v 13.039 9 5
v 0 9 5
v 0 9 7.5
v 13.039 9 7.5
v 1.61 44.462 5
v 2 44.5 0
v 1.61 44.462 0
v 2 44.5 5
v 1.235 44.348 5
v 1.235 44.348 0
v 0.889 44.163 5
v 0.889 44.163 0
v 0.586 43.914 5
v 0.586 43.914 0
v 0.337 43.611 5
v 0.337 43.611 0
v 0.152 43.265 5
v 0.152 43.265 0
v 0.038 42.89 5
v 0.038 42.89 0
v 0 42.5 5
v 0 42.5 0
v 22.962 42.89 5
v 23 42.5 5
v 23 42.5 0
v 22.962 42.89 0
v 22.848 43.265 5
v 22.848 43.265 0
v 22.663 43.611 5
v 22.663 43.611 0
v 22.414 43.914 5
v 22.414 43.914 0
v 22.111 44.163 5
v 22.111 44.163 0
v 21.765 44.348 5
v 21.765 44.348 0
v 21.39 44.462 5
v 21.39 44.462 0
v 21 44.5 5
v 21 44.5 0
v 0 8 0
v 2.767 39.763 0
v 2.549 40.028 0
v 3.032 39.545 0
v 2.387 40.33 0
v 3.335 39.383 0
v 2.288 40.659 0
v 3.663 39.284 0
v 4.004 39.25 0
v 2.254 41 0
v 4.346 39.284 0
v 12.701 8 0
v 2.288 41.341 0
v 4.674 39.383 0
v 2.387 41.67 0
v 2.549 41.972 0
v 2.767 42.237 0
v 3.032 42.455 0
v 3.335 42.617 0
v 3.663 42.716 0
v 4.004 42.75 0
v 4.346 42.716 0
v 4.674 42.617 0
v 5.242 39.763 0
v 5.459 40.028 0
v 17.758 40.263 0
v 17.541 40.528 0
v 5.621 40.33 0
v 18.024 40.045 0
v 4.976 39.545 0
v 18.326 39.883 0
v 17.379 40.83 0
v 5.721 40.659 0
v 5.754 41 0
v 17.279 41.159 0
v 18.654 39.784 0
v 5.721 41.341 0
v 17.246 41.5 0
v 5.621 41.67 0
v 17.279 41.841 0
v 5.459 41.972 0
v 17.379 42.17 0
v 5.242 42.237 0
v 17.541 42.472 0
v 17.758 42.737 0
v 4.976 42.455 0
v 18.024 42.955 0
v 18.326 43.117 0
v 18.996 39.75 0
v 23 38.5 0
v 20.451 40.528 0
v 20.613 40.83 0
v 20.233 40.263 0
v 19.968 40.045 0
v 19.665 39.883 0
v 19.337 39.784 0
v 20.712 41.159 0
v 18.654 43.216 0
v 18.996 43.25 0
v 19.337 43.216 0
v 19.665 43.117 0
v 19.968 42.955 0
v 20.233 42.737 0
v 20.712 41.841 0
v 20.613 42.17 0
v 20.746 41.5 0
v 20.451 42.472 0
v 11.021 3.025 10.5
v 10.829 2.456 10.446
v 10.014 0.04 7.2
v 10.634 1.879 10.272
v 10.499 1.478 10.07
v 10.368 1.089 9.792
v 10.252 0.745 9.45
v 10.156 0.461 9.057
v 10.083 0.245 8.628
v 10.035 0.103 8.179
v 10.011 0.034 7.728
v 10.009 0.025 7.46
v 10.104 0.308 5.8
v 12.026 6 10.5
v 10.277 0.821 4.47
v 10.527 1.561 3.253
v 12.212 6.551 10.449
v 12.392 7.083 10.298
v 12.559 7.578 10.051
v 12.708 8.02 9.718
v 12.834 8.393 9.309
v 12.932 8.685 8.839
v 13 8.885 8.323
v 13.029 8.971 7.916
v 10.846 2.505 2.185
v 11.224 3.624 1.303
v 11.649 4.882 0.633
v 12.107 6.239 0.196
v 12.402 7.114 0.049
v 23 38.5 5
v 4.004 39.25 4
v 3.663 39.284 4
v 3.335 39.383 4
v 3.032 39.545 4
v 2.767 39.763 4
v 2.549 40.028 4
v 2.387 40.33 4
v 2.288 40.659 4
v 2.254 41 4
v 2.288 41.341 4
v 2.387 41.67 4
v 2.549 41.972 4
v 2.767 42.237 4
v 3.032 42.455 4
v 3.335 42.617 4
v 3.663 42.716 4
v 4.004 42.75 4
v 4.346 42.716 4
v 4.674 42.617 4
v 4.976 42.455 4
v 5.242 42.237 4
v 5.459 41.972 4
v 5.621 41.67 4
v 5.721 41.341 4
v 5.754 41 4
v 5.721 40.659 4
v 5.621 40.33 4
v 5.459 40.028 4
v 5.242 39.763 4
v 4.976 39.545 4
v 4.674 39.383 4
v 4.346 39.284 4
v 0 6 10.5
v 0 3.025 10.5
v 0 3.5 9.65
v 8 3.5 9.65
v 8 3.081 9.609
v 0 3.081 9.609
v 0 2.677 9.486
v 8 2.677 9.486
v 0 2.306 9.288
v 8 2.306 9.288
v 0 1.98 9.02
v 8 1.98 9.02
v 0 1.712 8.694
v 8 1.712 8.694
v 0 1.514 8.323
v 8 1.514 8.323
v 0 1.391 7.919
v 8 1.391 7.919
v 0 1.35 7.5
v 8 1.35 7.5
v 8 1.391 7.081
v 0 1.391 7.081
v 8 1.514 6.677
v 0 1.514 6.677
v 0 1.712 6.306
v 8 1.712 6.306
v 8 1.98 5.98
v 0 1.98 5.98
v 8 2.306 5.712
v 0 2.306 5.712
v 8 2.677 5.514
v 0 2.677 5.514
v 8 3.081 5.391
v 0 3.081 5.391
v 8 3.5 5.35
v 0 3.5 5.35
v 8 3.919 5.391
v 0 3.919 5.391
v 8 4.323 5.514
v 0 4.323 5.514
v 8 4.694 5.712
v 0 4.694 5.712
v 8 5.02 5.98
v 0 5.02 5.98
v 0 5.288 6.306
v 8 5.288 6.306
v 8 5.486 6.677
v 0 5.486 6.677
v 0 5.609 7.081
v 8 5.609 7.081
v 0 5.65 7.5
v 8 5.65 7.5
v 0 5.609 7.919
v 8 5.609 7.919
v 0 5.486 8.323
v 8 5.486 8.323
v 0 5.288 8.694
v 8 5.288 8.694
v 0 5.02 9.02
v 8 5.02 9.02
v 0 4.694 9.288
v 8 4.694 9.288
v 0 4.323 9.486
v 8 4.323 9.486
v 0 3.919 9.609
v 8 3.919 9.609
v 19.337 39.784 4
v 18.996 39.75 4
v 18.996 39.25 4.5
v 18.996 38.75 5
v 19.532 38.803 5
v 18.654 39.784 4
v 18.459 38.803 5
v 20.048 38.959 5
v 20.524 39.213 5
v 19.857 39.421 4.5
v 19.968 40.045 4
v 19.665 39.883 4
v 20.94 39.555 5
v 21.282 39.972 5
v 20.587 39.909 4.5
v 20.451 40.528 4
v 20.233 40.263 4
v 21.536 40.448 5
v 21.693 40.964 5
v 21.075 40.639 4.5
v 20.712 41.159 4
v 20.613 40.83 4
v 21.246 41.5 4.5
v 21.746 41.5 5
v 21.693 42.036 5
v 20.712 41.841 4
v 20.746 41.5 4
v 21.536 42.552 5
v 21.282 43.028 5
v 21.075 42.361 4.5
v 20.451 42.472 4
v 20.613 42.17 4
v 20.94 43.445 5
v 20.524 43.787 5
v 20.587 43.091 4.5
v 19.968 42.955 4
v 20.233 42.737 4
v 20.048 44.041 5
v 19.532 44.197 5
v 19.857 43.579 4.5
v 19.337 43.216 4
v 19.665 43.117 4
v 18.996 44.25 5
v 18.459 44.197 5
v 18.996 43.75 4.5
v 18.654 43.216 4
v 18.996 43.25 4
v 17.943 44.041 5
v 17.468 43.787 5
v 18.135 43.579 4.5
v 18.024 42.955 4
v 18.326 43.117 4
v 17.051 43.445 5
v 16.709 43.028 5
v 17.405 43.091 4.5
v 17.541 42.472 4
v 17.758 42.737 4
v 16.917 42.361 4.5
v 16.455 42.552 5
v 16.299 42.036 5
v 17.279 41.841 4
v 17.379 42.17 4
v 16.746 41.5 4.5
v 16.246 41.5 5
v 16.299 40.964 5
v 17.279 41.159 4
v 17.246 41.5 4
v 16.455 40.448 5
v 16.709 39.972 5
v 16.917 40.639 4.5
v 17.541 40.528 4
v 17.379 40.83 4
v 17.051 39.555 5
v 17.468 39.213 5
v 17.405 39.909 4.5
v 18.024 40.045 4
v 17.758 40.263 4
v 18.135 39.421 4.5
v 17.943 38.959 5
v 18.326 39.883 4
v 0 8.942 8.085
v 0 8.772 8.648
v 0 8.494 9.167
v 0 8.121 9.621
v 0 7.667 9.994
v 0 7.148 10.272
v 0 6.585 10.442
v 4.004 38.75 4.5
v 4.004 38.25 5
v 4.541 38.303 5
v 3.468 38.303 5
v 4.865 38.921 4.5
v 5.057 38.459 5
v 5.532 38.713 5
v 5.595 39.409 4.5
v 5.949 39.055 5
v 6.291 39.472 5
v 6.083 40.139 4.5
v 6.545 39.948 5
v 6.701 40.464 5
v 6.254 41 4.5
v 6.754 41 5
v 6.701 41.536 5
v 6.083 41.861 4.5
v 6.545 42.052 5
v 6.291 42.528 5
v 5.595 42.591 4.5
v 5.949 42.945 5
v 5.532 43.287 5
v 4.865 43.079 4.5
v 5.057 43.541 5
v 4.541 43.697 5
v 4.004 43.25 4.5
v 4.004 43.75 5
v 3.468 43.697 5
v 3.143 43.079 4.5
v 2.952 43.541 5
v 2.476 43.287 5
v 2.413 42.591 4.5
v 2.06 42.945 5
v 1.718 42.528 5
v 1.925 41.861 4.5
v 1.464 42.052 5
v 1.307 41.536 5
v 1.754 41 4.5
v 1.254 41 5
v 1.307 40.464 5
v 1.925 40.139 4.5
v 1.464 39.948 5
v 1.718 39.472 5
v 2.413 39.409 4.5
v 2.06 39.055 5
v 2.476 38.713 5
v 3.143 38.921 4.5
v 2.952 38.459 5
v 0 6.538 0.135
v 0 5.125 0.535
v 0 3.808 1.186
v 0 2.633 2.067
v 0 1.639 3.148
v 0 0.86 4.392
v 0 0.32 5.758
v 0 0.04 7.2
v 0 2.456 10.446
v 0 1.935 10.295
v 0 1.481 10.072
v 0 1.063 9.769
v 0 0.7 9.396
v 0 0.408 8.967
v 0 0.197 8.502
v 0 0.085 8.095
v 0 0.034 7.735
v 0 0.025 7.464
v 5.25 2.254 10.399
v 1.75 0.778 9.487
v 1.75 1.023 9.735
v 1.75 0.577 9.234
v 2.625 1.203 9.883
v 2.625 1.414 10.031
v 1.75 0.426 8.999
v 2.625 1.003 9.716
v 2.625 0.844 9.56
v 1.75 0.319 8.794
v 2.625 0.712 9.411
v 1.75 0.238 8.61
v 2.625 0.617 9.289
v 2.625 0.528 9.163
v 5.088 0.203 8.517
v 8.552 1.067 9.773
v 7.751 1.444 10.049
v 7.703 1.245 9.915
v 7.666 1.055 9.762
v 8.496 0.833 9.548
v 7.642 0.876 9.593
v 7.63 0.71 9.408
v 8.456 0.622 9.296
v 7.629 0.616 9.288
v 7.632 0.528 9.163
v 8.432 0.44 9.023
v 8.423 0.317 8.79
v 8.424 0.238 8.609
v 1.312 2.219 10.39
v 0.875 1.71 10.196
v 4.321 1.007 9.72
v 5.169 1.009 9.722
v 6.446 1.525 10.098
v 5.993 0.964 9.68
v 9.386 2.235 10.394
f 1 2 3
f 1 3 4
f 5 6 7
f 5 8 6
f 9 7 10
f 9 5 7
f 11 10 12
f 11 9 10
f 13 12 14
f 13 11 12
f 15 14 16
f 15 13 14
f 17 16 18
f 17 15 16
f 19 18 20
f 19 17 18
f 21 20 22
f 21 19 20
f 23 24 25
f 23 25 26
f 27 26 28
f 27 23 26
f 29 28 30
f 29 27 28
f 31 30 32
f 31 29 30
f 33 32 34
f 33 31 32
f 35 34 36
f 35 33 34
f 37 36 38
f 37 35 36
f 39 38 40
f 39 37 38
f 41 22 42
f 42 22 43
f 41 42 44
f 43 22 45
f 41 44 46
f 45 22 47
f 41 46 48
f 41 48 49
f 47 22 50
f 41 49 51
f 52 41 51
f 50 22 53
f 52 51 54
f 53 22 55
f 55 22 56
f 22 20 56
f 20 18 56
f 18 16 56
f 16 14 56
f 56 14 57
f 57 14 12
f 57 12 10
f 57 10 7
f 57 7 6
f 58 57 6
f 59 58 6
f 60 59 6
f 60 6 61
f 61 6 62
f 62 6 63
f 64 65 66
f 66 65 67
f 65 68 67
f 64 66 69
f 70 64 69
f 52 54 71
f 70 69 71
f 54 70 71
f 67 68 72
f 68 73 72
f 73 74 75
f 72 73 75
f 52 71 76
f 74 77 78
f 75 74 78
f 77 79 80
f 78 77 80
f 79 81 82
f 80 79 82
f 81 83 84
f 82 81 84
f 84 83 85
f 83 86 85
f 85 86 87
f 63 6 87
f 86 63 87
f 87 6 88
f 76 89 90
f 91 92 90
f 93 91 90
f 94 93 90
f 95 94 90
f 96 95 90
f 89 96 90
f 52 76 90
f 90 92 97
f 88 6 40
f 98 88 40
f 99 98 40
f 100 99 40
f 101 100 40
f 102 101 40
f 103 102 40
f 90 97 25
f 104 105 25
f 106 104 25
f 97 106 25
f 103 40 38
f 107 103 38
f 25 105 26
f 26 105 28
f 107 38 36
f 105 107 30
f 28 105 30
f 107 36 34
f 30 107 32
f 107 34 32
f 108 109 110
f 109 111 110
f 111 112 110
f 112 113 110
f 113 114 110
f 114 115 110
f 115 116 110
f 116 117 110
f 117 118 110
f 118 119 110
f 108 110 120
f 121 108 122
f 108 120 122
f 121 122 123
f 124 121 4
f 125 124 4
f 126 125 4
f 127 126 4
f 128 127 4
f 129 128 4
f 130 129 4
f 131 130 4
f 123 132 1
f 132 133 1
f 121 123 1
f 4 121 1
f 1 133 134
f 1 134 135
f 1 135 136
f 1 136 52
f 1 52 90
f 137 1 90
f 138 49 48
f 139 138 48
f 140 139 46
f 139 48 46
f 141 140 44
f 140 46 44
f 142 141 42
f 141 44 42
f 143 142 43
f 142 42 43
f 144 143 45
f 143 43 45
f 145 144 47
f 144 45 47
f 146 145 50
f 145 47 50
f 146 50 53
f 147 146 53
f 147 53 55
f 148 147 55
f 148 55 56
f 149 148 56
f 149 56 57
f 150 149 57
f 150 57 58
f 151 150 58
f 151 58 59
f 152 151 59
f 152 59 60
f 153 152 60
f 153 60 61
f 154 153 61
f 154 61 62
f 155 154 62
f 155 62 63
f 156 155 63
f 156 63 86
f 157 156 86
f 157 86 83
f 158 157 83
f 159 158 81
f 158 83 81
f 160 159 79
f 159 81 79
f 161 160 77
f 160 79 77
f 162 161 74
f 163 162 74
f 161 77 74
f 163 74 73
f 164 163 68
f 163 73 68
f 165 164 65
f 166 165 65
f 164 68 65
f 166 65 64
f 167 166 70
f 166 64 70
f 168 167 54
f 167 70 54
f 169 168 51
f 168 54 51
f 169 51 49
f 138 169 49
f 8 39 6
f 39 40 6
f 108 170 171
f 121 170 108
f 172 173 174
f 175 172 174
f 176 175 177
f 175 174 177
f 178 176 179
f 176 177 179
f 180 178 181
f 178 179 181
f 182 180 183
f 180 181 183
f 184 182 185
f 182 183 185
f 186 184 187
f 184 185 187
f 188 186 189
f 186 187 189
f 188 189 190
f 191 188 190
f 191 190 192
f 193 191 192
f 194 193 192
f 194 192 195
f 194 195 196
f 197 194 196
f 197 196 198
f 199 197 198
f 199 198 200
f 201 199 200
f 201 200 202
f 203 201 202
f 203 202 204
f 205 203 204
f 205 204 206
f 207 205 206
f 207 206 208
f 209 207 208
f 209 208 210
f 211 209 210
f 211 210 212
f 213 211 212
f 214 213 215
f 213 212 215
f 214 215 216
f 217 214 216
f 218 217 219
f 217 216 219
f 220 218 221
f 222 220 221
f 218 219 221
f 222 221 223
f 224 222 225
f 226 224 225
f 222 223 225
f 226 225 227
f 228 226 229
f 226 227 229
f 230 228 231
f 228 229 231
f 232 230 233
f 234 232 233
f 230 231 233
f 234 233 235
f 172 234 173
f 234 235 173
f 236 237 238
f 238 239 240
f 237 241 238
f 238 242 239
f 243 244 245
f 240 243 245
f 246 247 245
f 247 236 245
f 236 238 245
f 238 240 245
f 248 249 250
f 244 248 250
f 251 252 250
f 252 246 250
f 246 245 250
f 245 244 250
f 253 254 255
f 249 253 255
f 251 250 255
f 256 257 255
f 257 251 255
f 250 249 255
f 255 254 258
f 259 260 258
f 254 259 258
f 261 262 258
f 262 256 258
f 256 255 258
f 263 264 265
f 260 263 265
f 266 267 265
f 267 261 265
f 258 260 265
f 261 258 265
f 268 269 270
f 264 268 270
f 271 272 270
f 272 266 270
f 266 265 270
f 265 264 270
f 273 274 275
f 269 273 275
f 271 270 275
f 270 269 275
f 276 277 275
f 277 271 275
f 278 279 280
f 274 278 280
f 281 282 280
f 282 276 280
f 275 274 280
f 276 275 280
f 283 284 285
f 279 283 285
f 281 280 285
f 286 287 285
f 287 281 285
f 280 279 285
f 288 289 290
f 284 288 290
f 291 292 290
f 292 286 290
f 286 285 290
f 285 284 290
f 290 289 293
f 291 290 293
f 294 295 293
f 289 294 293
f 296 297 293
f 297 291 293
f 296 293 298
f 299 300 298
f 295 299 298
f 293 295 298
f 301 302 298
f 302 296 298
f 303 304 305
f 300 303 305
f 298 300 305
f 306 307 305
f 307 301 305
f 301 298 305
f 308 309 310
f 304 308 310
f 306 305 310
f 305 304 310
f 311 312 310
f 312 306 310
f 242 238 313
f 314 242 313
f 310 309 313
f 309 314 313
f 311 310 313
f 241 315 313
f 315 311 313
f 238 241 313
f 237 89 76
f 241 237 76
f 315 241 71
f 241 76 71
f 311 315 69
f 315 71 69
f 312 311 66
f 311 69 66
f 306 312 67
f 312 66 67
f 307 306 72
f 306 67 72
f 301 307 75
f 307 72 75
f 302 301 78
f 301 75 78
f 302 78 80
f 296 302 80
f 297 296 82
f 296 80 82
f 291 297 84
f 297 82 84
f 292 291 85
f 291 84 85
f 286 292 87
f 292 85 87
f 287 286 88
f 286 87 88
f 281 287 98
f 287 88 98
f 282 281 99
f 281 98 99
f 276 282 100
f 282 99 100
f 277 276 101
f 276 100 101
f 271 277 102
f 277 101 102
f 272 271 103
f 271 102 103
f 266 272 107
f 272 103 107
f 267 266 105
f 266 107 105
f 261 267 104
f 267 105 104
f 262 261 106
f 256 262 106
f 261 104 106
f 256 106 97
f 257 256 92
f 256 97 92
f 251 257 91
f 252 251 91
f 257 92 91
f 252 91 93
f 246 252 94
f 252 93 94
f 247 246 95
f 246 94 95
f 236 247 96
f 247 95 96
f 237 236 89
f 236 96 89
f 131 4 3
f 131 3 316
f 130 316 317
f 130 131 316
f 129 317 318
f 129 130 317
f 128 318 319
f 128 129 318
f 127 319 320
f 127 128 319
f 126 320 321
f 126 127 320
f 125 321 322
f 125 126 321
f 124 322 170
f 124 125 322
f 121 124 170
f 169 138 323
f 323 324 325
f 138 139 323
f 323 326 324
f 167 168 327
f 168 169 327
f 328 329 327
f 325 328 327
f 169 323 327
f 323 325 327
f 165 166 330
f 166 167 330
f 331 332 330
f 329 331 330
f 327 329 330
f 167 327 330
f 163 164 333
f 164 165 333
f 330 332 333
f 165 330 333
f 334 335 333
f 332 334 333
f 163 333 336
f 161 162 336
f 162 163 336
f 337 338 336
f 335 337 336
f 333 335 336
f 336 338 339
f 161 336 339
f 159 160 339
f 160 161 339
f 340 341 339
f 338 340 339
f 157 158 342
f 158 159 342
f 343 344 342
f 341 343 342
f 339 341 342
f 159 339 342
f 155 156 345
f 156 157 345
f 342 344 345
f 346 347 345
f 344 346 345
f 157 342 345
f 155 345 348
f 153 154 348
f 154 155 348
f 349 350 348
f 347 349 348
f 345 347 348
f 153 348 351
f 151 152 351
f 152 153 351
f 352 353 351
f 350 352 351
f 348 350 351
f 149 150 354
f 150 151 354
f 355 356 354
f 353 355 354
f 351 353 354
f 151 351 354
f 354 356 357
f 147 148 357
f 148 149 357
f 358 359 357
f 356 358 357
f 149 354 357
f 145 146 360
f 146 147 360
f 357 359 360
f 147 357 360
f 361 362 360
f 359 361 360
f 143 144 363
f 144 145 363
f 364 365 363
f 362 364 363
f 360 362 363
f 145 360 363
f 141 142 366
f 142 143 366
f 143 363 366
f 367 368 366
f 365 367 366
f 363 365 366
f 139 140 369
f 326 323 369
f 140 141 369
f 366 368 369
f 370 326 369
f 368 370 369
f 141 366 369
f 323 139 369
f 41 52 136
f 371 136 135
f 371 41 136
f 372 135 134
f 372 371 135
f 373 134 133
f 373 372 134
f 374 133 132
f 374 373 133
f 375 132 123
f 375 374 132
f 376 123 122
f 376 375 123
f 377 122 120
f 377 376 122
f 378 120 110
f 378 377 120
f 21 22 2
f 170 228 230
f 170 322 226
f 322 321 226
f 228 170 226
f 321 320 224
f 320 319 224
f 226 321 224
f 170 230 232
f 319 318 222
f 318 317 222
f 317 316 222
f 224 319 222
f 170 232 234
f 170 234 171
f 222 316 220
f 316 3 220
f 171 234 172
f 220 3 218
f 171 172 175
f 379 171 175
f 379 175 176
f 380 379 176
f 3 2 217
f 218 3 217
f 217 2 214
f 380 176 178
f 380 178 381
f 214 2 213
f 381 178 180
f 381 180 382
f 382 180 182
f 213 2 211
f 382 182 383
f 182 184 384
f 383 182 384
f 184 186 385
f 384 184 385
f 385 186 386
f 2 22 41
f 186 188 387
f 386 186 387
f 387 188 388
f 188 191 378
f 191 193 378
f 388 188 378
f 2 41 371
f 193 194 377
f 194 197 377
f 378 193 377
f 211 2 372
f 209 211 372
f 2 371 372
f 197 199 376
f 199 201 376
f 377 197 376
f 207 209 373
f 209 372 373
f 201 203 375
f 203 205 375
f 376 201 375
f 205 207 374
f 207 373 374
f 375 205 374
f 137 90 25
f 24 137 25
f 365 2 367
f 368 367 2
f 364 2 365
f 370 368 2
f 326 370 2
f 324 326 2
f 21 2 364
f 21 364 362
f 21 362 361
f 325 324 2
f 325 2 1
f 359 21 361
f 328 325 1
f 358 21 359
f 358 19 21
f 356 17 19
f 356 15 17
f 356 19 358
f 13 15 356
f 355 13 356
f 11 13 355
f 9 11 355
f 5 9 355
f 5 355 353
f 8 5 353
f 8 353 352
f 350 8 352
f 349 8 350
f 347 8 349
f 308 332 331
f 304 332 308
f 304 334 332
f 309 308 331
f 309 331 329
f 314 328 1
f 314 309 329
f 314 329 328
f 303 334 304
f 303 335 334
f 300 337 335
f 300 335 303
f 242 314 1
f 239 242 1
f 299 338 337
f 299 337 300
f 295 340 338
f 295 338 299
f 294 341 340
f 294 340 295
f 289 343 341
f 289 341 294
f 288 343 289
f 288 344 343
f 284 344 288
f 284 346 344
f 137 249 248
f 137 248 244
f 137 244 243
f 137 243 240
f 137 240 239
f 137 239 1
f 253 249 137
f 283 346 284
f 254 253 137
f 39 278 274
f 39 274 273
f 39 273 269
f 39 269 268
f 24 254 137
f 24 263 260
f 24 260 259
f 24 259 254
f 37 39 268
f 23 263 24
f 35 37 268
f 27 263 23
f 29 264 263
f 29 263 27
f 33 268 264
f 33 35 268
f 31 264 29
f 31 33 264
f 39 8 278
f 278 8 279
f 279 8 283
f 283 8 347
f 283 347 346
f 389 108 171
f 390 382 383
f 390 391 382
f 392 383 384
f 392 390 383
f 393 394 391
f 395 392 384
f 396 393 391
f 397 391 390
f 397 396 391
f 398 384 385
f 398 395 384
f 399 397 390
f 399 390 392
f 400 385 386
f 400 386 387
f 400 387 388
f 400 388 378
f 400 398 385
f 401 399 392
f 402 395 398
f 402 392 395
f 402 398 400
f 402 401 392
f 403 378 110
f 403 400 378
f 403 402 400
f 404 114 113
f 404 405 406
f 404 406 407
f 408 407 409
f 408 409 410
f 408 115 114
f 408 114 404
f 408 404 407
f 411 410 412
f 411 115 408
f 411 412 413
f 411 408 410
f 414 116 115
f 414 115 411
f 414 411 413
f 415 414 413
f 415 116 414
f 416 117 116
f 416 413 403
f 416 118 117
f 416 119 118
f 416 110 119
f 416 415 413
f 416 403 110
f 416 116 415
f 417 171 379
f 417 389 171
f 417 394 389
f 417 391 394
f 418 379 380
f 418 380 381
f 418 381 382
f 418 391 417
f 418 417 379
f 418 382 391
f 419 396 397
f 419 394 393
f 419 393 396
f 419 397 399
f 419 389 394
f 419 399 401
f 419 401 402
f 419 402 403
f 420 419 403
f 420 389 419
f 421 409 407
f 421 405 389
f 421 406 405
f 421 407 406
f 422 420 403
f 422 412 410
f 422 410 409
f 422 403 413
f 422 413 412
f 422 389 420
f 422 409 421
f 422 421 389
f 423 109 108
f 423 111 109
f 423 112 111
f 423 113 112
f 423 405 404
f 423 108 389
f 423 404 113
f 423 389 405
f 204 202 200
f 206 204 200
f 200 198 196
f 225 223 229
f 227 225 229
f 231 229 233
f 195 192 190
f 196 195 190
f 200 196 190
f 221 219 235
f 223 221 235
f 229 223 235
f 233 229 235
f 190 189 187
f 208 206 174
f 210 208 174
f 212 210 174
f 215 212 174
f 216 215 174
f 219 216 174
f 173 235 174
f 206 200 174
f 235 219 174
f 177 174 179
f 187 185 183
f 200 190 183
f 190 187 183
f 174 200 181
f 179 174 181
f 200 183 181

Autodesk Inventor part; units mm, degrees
ref_plane "YZ Plane" through (0, 0, 0) normal (1, 0, 0) x (0, 1, 0)
ref_plane "XZ Plane" through (0, 0, 0) normal (0, 1, 0) x (-1, 0, 0)
ref_plane "XY Plane" through (0, 0, 0) normal (0, 0, 1) x (1, 0, 0)
sketch "Skizze1" plane through (0, 0, 0) normal (0, 0, 1) x (1, 0, 0)
  line L0 (10, 0) -> (23, 38.5)
  line L1 (23, 38.5) -> (23, 44.5)
  line L2 (23, 44.5) -> (0, 44.5)
  line L3 (0, 44.5) -> (0, 0)
  line L4 (10, 0) -> (0, 0)
  dimension "d0" = 38.5
  dimension "d1" = 6
  dimension "d2" = 23
  dimension "d4" = 10
extrude "Extrusion1" add sketch "Skizze1" along normal blind 5
sketch "Skizze3" plane through (0, 0, 5) normal (0, 0, 1) x (1, 0, 0)
  line L0 (23, 38.5) -> (23, 44.5) projected
  line L1 (23, 41.5) -> (18.9958, 41.5) construction
  line L2 (4.0042, 41) -> (0, 41) construction
  line L3 (0, 44.5) -> (0, 0) construction
  dimension "d35" = 0.5
  dimension "d36" = 15
hole "Bohrung2" at (4.0042, 41, 5) at (18.9958, 41.5, 5) direction (0, 0, -1) diameter 3.5 end through all
sketch "Skizze4" plane through (0, 0, 5) normal (0, 0, 1) x (1, 0, 0)
  line L0 (0, 44.5) -> (0, 0) projected
  line L1 (0, 9) -> (13.039, 9)
  line L2 (0, 0) -> (10, 0) projected
  line L3 (10, 0) -> (23, 38.5) projected
  dimension "d24" = 9
extrude "Extrusion2" add sketch "Skizze4" along normal blind 5.5
sketch "Skizze2" plane through (0, 0, 0) normal (-1, 0, 0) x (0, 0, 1)
  line L0 (0, 0) -> (5, 0) projected
  line L1 (5, 9) -> (10.5, 9) projected
  line L2 (10.5, 9) -> (10.5, 0) projected
  point P0 (7.5, 3.5)
  dimension "d27" = 3.5
  dimension "d37" = 3
hole "Bohrung1" at (0, 3.5, 7.5) direction (1, 0, 0) diameter 4.3 depth 8
fillet "Rundung2" radius 8 1 edges at (5, 0, 0)
fillet "Rundung3" radius 3 1 edges at (6.5195, 9, 10.5)
fillet "Rundung4" radius 3 1 edges at (5, 0, 10.5)
chamfer "Fasen1" distance 1 angle 45 2 edges at (4.0042, 42.75, 5) (18.9958, 43.25, 5)
fillet "Rundung5" radius 2 2 edges at (0, 44.5, 2.5) (23, 44.5, 2.5)
properties part number "Lupfer Seite"
